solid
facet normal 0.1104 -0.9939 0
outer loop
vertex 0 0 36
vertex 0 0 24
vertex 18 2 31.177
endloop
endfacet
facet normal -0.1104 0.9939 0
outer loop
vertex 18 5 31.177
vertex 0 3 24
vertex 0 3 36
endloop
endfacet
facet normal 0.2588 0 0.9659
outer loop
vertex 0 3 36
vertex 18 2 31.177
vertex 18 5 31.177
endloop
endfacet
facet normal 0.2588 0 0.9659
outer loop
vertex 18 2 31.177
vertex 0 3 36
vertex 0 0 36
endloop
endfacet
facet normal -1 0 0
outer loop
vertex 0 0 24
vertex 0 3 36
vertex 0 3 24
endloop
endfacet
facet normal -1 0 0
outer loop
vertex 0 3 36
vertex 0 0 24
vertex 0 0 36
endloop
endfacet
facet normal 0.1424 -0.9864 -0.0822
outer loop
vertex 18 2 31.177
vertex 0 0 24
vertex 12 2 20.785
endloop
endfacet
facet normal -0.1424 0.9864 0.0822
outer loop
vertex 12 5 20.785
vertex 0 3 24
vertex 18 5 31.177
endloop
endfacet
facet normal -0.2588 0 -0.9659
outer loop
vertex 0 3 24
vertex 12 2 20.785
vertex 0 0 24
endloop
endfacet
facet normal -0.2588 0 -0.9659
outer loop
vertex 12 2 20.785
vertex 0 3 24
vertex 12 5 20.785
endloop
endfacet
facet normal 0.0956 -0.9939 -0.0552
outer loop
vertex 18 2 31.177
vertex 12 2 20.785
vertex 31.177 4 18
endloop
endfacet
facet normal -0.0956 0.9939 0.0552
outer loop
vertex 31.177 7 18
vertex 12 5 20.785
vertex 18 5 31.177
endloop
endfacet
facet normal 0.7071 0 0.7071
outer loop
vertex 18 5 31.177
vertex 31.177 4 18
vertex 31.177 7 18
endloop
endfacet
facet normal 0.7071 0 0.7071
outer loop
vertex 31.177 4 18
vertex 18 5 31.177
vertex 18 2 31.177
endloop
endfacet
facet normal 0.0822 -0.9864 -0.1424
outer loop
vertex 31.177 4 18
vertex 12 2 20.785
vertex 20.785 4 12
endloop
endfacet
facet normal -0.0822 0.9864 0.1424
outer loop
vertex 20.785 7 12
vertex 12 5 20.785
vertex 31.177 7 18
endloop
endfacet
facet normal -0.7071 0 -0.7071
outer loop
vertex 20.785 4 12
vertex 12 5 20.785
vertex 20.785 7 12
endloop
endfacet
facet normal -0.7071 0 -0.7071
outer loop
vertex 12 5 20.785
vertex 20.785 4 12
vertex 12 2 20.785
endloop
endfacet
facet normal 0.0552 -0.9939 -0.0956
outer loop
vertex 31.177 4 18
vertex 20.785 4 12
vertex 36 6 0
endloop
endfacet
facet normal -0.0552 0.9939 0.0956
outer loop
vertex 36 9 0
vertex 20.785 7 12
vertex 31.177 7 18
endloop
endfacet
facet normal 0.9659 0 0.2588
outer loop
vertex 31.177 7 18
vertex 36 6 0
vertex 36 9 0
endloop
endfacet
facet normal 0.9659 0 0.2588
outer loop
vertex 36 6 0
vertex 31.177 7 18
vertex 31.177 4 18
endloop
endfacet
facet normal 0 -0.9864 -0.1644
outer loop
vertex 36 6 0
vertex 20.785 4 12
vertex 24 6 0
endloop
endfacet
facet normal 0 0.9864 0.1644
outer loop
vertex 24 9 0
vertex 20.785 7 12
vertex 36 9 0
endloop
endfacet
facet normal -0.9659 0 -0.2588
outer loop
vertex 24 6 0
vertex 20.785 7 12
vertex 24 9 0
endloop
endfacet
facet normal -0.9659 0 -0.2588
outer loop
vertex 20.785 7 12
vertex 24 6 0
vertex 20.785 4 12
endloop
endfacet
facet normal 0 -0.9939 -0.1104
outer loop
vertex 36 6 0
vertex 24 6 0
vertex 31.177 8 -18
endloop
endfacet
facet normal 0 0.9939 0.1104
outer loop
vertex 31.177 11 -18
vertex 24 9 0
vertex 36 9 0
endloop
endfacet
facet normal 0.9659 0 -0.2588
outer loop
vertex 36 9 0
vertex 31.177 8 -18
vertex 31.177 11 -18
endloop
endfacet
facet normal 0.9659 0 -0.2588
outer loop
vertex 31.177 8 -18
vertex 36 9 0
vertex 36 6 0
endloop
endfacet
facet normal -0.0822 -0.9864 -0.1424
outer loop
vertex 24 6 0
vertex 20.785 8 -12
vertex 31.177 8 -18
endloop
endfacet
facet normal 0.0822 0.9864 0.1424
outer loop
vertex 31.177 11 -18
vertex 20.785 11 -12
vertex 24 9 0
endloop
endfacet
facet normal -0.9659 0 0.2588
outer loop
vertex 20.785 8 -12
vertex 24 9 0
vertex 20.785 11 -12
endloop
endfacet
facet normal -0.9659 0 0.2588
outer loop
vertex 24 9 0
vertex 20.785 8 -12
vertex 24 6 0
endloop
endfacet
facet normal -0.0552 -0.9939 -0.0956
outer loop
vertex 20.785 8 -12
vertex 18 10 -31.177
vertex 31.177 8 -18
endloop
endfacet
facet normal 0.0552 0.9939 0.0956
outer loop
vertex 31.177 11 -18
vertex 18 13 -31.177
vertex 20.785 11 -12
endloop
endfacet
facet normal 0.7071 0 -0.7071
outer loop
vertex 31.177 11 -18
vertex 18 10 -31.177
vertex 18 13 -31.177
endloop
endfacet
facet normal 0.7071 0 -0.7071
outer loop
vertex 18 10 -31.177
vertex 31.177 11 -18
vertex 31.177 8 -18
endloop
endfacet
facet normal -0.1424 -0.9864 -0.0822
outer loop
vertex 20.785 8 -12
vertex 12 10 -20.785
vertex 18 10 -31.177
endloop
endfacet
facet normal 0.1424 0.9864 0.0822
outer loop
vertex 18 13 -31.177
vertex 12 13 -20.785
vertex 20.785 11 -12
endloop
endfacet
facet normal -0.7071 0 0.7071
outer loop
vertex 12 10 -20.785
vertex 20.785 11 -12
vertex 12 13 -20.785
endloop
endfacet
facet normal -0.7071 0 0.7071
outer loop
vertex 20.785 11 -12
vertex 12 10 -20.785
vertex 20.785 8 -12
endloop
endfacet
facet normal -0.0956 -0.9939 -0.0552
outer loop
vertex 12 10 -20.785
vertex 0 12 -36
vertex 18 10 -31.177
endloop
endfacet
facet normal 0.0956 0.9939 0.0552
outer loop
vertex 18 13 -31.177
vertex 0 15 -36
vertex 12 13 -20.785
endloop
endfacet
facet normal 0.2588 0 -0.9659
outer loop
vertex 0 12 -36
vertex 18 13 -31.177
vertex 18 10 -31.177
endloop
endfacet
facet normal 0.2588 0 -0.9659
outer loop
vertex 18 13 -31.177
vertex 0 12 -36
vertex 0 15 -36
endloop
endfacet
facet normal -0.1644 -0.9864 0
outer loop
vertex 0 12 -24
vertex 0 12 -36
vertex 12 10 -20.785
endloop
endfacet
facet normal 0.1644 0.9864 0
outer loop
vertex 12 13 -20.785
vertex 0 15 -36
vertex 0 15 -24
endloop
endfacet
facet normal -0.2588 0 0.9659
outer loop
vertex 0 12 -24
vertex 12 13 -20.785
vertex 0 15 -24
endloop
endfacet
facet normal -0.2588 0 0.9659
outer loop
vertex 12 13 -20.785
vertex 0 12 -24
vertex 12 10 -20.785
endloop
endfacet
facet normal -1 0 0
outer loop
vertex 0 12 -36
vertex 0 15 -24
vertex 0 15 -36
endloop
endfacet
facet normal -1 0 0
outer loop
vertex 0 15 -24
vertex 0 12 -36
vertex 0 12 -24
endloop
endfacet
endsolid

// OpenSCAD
//
//
//

module spiral_ramp_section(inner_radius = 10,
                           outer_radius = 20,
                           tower_height = 20,
                           angle_start = 0,
                           angle_sweep = 20,
                           y_start = 0,
                           y_rise = 2,
                           thickness = 1,
                           part = 0)
{
    // p0 and p1 are on the right of the ramp section
    p0x = inner_radius * sin(angle_start);
    p0y = y_start;
    p0z = inner_radius * cos(angle_start);

    p1x = outer_radius * sin(angle_start);
    p1y = y_start;
    p1z = outer_radius * cos(angle_start);

    // p2 and p3 are on the left of the ramp section
    p2x = outer_radius * sin(angle_start + angle_sweep);
    p2y = y_start + y_rise;
    p2z = outer_radius * cos(angle_start + angle_sweep);

    p3x = inner_radius * sin(angle_start + angle_sweep);
    p3y = y_start + y_rise;
    p3z = inner_radius * cos(angle_start + angle_sweep);

    section_points = [[p0x, p0y, p0z], // 0
                      [p1x, p1y, p1z], // 1
                      [p2x, p2y, p2z], // 2
                      [p3x, p3y, p3z], // 3
                      [p0x, p0y + thickness, p0z], // 4
                      [p1x, p1y + thickness, p1z], // 5
                      [p2x, p2y + thickness, p2z], // 6
                      [p3x, p3y + thickness, p3z]  // 7
                      ];

    if (part == 0) {
        polyhedron(points=section_points,
                   faces=[[2, 1, 0], // bottom
                          [4, 5, 6], // top
                          [1, 2, 6, 5], // far
                          [4, 6, 2, 0], // center
                          [0, 1, 5, 4]] // right
                   );
    } else if (part == 1) {
        polyhedron(points=section_points,
                   faces=[[3, 2, 0], // bottom
                          [4, 6, 7], // top
                          [0, 4, 7, 3], // near
                          [0, 2, 6, 4], // center
                          [2, 3, 7, 6]] // left
                   );
    }
}


inner_radius = 24;
outer_radius = 36;
tower_height = 20;
thickness = 3;
angle_start = 0;
subsection_count = 4;
sections = 6;
total_angle_sweep = 180.0;
angle_sweep = total_angle_sweep / sections;
y_rise = 2;

combined = 1; // this can be overridden by the Makefile

if (combined == 1) {
    difference() {
        for(nth=[0:1:sections*2-1]) {
            spiral_ramp_section(inner_radius = inner_radius,
                                outer_radius = outer_radius,
                                tower_height = tower_height,
                                angle_start = floor( nth / 2.0 ) * angle_sweep,
                                angle_sweep = angle_sweep,
                                y_start = floor( nth / 2.0 ) * y_rise,
                                y_rise = y_rise,
                                thickness = thickness,
                                part = nth - floor( nth / 2.0 ) * 2);
        }
    }
} else {
    // do part of one pie-slice of the tower
    spiral_ramp_section(inner_radius = inner_radius,
                        outer_radius = outer_radius,
                        tower_height = tower_height,
                        angle_start = floor( nth / 2.0 ) * angle_sweep,
                        angle_sweep = angle_sweep,
                        y_start = floor( nth / 2.0 ) * y_rise,
                        y_rise = y_rise,
                        thickness = thickness,
                        part = nth - floor( nth / 2.0 ) * 2.0);
}
